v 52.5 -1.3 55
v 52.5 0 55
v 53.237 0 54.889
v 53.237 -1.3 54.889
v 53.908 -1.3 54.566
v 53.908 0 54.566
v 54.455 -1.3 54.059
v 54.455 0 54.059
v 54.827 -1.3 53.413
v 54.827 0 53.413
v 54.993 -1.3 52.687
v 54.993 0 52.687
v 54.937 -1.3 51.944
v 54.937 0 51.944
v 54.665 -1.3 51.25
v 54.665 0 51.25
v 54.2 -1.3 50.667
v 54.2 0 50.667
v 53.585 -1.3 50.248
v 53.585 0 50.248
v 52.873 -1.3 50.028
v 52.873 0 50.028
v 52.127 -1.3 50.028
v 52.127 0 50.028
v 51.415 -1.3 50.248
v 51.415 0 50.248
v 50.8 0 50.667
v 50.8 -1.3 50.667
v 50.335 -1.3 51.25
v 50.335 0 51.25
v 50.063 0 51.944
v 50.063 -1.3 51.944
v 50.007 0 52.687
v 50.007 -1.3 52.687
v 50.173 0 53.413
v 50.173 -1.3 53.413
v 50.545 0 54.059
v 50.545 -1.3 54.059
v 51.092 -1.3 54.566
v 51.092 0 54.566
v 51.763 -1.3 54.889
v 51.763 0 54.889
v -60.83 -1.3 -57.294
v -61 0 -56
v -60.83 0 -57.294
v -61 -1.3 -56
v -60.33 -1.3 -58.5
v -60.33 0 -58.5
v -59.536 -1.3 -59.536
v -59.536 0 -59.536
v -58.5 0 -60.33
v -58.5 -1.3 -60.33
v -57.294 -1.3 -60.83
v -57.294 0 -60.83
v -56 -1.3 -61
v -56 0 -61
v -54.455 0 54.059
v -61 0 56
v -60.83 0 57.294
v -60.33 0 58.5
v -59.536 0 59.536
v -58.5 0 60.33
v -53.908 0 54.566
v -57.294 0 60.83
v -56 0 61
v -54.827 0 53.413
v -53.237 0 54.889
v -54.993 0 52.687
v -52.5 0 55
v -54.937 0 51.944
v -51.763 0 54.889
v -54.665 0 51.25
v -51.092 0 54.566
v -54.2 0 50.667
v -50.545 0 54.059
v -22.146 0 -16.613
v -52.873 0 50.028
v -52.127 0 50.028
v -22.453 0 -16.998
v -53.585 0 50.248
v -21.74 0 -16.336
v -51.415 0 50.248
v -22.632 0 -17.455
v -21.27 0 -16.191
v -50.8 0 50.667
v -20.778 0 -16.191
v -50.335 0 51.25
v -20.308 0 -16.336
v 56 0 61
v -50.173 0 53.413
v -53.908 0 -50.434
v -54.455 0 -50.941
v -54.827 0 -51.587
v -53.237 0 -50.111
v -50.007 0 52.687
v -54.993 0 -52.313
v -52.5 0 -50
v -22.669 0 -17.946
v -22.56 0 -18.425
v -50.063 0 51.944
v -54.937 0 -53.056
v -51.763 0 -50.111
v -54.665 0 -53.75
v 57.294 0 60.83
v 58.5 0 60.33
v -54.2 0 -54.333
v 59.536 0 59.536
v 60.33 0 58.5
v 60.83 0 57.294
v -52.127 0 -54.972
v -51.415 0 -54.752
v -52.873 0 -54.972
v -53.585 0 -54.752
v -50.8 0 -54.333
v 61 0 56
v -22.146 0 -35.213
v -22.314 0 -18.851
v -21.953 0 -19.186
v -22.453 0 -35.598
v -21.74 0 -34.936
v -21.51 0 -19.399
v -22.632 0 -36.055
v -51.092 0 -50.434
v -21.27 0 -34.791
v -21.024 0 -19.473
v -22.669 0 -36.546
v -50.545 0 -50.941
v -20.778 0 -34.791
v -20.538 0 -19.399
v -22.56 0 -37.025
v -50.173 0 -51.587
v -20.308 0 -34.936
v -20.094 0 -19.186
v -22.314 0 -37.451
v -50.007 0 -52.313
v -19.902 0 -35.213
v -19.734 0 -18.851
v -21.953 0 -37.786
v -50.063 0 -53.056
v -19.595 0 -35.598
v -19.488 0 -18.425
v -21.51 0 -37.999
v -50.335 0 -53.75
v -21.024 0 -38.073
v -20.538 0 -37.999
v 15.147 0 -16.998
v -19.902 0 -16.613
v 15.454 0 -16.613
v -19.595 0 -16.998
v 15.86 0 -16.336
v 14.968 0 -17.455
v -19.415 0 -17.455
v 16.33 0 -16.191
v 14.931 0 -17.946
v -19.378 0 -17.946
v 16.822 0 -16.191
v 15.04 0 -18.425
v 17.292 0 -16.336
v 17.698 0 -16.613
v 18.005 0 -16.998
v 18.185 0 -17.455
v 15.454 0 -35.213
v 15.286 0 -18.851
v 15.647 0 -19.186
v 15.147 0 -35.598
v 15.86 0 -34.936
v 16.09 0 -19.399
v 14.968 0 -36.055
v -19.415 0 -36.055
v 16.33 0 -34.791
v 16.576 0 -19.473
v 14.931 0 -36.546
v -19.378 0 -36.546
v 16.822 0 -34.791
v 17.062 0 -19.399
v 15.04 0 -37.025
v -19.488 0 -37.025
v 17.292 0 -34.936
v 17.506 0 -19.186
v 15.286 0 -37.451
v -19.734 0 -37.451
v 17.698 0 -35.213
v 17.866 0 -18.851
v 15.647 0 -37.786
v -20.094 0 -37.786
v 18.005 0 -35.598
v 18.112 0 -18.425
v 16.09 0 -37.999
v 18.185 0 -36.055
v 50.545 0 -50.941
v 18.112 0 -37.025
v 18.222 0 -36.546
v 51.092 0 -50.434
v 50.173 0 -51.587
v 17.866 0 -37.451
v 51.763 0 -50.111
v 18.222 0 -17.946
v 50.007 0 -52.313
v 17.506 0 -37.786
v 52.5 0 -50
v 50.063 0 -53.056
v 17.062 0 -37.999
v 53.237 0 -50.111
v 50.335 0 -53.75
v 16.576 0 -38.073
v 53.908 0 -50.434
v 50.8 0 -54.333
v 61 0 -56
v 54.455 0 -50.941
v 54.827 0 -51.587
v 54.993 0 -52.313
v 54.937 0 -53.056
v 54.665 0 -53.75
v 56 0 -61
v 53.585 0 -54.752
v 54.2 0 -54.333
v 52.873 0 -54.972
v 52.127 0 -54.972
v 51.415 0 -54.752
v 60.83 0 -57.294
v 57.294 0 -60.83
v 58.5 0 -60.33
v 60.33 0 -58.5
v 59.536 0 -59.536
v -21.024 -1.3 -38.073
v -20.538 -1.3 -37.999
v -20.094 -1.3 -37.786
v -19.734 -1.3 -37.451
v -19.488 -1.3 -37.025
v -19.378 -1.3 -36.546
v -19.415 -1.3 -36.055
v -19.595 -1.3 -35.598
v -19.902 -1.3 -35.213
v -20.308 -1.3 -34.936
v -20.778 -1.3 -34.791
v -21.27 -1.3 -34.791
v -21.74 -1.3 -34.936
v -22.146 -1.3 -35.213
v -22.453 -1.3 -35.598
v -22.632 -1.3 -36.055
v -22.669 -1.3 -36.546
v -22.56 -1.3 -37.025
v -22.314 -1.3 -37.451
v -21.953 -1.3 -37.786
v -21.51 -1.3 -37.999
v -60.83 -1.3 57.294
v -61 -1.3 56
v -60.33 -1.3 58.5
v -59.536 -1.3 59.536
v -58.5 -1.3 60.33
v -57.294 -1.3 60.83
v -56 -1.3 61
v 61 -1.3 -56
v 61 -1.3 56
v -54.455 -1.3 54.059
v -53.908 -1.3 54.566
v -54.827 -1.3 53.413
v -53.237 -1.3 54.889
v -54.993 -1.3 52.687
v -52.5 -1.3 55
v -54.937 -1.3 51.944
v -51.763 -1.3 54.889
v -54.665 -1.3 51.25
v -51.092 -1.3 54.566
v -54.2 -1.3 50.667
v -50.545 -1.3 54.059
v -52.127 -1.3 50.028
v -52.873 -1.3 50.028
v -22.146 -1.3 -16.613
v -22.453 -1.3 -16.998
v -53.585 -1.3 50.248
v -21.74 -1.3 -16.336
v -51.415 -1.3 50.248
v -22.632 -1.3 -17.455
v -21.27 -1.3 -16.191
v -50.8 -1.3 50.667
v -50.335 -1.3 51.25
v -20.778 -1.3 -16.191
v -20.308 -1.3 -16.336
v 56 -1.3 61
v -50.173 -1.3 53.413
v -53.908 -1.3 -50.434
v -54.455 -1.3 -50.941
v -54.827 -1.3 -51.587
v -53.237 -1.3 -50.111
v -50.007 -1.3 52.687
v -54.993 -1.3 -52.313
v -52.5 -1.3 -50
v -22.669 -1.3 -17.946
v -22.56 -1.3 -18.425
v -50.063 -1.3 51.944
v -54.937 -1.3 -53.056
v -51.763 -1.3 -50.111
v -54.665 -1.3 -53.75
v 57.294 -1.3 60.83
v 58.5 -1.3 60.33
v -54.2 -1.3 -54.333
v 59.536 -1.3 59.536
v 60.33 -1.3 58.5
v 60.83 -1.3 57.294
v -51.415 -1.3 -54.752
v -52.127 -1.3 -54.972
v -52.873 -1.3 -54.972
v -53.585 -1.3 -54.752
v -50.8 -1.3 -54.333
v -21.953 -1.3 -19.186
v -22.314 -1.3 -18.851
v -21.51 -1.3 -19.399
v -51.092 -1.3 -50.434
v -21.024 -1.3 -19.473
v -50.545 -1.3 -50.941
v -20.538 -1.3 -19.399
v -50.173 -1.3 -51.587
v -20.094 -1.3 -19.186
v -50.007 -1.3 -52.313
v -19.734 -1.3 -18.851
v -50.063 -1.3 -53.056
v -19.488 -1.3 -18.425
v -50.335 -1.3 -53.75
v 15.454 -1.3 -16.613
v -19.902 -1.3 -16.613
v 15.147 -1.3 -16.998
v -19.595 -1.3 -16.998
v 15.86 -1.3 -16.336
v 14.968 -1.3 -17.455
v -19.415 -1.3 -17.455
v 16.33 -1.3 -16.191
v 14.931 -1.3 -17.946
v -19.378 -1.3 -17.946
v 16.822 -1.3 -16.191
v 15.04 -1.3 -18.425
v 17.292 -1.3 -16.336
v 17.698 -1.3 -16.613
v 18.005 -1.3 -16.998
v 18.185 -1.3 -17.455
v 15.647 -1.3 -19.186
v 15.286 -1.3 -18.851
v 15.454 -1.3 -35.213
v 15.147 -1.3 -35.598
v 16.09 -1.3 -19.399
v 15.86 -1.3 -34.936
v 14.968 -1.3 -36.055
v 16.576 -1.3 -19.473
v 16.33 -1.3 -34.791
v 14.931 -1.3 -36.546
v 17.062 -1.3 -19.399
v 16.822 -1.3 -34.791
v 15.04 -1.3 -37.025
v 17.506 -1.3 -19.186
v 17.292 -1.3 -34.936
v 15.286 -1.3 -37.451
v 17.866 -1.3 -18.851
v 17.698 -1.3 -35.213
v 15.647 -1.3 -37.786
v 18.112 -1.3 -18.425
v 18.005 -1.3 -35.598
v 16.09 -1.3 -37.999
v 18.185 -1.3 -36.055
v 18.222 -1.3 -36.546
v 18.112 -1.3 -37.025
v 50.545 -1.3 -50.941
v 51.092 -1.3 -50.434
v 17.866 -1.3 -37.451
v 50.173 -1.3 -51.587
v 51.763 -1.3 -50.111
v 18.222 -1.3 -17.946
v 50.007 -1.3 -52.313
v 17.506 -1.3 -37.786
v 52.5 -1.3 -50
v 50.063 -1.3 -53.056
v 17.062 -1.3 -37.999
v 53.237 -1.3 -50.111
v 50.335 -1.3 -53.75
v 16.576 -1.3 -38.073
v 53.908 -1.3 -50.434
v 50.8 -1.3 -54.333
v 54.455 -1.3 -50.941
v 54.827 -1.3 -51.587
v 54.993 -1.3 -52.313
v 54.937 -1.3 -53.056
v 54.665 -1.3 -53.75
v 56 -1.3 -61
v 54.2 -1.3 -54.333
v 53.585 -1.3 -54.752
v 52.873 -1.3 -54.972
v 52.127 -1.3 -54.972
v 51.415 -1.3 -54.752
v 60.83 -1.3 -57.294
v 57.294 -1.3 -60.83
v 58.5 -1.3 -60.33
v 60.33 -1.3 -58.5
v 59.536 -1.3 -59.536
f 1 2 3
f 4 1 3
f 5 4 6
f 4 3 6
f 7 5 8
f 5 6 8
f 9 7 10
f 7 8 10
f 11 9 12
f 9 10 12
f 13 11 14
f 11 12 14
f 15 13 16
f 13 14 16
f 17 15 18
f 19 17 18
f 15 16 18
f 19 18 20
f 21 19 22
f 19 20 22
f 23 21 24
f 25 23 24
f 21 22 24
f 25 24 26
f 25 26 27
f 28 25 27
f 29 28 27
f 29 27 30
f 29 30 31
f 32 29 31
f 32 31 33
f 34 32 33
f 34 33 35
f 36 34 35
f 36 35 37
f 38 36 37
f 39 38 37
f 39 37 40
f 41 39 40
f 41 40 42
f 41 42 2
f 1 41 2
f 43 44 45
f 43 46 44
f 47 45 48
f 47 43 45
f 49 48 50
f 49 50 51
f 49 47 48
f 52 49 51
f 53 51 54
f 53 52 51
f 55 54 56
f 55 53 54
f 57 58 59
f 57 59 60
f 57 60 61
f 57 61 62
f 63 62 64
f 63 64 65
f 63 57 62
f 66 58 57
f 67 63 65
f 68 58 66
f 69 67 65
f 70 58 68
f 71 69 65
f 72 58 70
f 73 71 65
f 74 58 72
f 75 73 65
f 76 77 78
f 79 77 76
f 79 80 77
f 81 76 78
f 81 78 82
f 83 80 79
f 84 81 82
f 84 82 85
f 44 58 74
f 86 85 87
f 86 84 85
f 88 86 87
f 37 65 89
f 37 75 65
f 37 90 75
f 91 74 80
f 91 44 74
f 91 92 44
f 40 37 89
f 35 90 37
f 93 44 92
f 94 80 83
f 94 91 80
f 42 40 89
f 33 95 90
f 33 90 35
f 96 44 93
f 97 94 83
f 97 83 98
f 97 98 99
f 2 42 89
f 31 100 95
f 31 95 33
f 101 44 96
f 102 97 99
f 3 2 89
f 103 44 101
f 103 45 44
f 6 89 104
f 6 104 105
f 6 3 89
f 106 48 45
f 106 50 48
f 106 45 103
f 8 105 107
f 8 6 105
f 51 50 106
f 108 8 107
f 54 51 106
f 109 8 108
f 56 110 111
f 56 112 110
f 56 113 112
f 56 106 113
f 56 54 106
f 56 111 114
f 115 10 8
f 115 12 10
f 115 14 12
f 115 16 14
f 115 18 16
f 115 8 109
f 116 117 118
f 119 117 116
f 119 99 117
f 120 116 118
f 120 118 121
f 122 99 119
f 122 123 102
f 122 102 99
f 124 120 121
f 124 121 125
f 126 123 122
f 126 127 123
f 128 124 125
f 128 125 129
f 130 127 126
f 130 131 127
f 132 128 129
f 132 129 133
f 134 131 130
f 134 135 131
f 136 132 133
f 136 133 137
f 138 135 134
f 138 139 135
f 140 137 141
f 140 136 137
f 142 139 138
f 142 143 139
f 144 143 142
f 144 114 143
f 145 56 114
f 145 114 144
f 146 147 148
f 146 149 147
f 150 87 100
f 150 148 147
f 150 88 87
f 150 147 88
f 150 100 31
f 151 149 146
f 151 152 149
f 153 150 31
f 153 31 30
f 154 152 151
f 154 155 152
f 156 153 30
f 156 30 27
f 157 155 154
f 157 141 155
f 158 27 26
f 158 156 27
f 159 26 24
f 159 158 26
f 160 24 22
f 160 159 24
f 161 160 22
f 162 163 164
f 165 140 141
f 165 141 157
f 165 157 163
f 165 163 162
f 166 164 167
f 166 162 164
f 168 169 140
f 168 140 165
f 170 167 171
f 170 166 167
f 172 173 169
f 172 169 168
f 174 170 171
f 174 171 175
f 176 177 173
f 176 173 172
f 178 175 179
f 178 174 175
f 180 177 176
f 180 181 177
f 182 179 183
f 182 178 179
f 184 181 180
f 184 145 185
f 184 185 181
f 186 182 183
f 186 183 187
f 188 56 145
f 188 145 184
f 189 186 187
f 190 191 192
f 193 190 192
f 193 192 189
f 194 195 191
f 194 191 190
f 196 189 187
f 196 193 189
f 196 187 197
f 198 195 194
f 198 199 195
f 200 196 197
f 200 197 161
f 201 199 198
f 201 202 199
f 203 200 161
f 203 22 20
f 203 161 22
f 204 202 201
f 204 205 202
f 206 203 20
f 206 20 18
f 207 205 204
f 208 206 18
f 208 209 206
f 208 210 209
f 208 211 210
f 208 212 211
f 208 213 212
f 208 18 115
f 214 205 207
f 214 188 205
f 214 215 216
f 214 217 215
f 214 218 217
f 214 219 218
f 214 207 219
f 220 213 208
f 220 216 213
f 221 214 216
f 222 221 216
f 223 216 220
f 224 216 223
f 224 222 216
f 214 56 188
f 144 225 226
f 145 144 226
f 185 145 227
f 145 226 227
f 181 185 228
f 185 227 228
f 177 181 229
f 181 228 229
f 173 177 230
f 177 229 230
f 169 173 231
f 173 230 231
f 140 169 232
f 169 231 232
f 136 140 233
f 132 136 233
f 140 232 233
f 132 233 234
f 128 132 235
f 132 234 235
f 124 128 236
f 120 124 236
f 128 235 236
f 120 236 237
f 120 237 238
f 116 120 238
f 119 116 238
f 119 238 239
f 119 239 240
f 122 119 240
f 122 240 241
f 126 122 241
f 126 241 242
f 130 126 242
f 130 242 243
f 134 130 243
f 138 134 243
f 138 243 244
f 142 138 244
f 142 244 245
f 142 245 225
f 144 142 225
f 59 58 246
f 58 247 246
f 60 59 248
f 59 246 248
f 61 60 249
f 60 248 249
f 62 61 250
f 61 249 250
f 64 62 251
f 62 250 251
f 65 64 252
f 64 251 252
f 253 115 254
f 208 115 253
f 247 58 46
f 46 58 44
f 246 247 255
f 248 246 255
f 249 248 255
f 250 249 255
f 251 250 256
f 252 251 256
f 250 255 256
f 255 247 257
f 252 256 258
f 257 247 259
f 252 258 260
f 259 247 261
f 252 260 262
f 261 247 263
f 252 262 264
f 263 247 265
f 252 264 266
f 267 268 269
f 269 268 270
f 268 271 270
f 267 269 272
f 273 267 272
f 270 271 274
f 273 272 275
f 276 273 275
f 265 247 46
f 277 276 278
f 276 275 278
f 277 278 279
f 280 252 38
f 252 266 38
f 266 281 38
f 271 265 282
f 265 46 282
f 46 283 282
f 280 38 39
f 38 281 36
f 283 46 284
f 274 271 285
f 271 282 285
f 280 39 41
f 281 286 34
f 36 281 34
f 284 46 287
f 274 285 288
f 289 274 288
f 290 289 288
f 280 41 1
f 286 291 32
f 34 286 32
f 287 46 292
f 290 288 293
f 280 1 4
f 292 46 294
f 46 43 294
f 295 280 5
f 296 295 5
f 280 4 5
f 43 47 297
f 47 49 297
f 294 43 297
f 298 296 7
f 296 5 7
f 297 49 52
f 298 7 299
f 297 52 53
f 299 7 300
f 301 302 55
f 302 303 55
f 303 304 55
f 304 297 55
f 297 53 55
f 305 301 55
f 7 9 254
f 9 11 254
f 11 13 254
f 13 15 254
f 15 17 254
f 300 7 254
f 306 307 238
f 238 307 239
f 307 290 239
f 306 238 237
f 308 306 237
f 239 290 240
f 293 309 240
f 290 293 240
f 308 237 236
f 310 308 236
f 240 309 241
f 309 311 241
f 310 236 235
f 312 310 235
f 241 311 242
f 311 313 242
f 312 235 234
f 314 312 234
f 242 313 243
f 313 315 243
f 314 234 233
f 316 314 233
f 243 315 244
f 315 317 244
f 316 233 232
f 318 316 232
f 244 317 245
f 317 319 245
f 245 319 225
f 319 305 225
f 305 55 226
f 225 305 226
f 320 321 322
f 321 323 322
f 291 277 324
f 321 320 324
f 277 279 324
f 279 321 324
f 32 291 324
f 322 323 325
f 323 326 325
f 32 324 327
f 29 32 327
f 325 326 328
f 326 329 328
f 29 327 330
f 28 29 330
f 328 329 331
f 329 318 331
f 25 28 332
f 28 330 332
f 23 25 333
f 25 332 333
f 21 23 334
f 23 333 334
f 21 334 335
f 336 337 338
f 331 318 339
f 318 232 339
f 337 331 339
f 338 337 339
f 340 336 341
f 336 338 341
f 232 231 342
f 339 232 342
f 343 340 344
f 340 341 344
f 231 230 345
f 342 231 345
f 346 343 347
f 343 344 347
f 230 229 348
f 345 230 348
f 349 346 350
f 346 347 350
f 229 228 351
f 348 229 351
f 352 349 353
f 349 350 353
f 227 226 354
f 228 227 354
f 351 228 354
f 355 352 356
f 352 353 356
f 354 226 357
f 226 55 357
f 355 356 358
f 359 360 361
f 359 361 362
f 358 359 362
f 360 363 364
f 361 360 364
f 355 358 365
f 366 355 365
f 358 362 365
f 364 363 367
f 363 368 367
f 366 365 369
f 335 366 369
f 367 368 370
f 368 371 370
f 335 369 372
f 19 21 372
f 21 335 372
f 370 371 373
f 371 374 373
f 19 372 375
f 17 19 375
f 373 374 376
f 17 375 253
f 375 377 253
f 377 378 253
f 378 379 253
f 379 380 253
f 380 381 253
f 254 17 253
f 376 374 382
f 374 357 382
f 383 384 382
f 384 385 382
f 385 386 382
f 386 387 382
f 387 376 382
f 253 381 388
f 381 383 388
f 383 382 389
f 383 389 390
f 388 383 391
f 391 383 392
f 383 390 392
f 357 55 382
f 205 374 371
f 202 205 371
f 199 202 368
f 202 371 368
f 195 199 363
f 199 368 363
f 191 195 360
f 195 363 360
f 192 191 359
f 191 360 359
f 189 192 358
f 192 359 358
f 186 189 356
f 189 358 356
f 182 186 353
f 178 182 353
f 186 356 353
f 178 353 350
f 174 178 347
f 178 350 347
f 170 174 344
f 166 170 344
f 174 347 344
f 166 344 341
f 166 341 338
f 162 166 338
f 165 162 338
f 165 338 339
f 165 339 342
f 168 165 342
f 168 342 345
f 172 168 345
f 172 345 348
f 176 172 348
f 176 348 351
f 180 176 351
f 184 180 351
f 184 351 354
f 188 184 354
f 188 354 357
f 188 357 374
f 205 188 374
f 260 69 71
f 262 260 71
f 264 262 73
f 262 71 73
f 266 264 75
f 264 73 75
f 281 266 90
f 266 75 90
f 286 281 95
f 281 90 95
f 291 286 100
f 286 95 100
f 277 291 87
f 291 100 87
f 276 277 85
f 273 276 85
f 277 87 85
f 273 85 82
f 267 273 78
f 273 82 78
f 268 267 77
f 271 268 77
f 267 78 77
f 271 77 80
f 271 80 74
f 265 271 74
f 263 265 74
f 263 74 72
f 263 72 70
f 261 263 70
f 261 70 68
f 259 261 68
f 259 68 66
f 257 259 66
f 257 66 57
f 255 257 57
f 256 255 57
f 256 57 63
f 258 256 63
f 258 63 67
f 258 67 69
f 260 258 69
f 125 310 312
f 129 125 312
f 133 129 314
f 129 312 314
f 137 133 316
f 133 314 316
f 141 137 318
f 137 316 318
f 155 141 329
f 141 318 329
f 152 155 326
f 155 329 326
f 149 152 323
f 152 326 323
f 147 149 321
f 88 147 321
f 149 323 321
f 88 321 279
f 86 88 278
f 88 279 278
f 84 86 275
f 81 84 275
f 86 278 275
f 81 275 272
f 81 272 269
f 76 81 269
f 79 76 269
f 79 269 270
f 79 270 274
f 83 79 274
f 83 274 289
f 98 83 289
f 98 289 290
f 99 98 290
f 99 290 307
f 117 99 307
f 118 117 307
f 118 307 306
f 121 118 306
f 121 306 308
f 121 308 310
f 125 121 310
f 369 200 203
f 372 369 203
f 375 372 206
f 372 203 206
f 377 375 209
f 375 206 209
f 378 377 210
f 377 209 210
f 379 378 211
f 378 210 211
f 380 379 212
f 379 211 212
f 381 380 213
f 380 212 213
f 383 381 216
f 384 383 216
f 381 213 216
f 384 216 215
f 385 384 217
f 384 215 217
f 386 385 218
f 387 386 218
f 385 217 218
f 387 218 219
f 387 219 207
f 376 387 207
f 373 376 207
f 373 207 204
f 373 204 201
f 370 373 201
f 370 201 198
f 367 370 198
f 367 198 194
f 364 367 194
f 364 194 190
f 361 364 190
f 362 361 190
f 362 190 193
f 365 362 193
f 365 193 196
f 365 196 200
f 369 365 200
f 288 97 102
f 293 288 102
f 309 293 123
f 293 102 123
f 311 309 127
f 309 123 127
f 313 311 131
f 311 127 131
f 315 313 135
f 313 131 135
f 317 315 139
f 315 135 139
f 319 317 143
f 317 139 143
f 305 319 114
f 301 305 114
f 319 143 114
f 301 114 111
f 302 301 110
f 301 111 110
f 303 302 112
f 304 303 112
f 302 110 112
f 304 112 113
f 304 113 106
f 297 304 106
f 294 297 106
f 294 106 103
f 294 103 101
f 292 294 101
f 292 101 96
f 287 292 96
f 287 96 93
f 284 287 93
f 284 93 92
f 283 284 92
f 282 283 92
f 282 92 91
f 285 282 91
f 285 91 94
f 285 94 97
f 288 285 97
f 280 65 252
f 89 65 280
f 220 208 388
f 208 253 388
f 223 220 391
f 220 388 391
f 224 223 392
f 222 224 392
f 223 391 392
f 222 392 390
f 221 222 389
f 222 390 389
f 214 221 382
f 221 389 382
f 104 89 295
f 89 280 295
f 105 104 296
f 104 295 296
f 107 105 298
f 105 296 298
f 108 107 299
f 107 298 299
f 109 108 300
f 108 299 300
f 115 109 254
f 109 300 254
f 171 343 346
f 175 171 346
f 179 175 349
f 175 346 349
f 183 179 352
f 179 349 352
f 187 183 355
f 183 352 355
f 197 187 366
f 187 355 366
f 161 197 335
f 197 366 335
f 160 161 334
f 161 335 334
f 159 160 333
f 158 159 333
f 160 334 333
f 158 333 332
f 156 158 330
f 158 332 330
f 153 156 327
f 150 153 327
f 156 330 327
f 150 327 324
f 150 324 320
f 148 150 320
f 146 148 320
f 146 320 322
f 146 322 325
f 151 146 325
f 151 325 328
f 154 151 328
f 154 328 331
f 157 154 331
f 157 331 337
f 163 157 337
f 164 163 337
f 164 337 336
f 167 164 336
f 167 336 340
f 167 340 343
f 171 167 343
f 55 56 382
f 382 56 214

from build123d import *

# Parameters (mm, degrees)
SKETCH1_W          = 122
SKETCH1_H          = 122
BASE_FLANGE1_DEPTH = 1.3
FILLET1_R          = 5
SKETCH3_R          = 2.5
CUT_EXTRUDE1_DEPTH = 10
SKETCH4_R          = 1.649999999
CUT_EXTRUDE2_DEPTH = 10


# Sheet-metal steps are written as plain solids
with BuildPart() as part:
    # Sketch1 → Base-Flange1 (new body)
    with BuildSketch(Plane(origin=(0, 0, 0), x_dir=(1, 0, 0), z_dir=(0, 1, 0))):
        Rectangle(SKETCH1_W, SKETCH1_H)
    extrude(amount=-BASE_FLANGE1_DEPTH)

    # Fillet1
    fillet1_edges = [part.edges().sort_by_distance(p)[0] for p in [
        (61, -0.65, 61),
        (-61, -0.65, 61),
        (-61, -0.65, -61),
        (61, -0.65, -61),
    ]]
    fillet(fillet1_edges, radius=FILLET1_R)

    # Sketch3 → Cut-Extrude1 (cut)
    with BuildSketch(Plane(origin=(0, 0, 0), x_dir=(1, 0, 0), z_dir=(0, 1, 0))):
        with Locations(Location((52.5, 52.5, 0), (0, 0, 270))):
            Circle(SKETCH3_R)
        with Locations(Location((-52.5, 52.5, 0), (0, 0, 270))):
            Circle(SKETCH3_R)
        with Locations(Location((-52.5, -52.5, 0), (0, 0, 270))):
            Circle(SKETCH3_R)
        with Locations(Location((52.5, -52.5, 0), (0, 0, 270))):
            Circle(SKETCH3_R)
    extrude(amount=-CUT_EXTRUDE1_DEPTH, mode=Mode.SUBTRACT)

    # Sketch4 → Cut-Extrude2 (cut)
    with BuildSketch(Plane(origin=(0, -1.3, 0), x_dir=(-1, 0, 0), z_dir=(0, -1, 0))):
        with Locations(Location((21.023848249, 36.422526924, 0), (0, 0, 90))):
            Circle(SKETCH4_R)
        with Locations(Location((21.023848249, 17.822526924, 0), (0, 0, 90))):
            Circle(SKETCH4_R)
        with Locations(Location((-16.576151751, 17.822526924, 0), (0, 0, 90))):
            Circle(SKETCH4_R)
        with Locations(Location((-16.576151751, 36.422526924, 0), (0, 0, 90))):
            Circle(SKETCH4_R)
    extrude(amount=-CUT_EXTRUDE2_DEPTH, mode=Mode.SUBTRACT)


solid = part.part
